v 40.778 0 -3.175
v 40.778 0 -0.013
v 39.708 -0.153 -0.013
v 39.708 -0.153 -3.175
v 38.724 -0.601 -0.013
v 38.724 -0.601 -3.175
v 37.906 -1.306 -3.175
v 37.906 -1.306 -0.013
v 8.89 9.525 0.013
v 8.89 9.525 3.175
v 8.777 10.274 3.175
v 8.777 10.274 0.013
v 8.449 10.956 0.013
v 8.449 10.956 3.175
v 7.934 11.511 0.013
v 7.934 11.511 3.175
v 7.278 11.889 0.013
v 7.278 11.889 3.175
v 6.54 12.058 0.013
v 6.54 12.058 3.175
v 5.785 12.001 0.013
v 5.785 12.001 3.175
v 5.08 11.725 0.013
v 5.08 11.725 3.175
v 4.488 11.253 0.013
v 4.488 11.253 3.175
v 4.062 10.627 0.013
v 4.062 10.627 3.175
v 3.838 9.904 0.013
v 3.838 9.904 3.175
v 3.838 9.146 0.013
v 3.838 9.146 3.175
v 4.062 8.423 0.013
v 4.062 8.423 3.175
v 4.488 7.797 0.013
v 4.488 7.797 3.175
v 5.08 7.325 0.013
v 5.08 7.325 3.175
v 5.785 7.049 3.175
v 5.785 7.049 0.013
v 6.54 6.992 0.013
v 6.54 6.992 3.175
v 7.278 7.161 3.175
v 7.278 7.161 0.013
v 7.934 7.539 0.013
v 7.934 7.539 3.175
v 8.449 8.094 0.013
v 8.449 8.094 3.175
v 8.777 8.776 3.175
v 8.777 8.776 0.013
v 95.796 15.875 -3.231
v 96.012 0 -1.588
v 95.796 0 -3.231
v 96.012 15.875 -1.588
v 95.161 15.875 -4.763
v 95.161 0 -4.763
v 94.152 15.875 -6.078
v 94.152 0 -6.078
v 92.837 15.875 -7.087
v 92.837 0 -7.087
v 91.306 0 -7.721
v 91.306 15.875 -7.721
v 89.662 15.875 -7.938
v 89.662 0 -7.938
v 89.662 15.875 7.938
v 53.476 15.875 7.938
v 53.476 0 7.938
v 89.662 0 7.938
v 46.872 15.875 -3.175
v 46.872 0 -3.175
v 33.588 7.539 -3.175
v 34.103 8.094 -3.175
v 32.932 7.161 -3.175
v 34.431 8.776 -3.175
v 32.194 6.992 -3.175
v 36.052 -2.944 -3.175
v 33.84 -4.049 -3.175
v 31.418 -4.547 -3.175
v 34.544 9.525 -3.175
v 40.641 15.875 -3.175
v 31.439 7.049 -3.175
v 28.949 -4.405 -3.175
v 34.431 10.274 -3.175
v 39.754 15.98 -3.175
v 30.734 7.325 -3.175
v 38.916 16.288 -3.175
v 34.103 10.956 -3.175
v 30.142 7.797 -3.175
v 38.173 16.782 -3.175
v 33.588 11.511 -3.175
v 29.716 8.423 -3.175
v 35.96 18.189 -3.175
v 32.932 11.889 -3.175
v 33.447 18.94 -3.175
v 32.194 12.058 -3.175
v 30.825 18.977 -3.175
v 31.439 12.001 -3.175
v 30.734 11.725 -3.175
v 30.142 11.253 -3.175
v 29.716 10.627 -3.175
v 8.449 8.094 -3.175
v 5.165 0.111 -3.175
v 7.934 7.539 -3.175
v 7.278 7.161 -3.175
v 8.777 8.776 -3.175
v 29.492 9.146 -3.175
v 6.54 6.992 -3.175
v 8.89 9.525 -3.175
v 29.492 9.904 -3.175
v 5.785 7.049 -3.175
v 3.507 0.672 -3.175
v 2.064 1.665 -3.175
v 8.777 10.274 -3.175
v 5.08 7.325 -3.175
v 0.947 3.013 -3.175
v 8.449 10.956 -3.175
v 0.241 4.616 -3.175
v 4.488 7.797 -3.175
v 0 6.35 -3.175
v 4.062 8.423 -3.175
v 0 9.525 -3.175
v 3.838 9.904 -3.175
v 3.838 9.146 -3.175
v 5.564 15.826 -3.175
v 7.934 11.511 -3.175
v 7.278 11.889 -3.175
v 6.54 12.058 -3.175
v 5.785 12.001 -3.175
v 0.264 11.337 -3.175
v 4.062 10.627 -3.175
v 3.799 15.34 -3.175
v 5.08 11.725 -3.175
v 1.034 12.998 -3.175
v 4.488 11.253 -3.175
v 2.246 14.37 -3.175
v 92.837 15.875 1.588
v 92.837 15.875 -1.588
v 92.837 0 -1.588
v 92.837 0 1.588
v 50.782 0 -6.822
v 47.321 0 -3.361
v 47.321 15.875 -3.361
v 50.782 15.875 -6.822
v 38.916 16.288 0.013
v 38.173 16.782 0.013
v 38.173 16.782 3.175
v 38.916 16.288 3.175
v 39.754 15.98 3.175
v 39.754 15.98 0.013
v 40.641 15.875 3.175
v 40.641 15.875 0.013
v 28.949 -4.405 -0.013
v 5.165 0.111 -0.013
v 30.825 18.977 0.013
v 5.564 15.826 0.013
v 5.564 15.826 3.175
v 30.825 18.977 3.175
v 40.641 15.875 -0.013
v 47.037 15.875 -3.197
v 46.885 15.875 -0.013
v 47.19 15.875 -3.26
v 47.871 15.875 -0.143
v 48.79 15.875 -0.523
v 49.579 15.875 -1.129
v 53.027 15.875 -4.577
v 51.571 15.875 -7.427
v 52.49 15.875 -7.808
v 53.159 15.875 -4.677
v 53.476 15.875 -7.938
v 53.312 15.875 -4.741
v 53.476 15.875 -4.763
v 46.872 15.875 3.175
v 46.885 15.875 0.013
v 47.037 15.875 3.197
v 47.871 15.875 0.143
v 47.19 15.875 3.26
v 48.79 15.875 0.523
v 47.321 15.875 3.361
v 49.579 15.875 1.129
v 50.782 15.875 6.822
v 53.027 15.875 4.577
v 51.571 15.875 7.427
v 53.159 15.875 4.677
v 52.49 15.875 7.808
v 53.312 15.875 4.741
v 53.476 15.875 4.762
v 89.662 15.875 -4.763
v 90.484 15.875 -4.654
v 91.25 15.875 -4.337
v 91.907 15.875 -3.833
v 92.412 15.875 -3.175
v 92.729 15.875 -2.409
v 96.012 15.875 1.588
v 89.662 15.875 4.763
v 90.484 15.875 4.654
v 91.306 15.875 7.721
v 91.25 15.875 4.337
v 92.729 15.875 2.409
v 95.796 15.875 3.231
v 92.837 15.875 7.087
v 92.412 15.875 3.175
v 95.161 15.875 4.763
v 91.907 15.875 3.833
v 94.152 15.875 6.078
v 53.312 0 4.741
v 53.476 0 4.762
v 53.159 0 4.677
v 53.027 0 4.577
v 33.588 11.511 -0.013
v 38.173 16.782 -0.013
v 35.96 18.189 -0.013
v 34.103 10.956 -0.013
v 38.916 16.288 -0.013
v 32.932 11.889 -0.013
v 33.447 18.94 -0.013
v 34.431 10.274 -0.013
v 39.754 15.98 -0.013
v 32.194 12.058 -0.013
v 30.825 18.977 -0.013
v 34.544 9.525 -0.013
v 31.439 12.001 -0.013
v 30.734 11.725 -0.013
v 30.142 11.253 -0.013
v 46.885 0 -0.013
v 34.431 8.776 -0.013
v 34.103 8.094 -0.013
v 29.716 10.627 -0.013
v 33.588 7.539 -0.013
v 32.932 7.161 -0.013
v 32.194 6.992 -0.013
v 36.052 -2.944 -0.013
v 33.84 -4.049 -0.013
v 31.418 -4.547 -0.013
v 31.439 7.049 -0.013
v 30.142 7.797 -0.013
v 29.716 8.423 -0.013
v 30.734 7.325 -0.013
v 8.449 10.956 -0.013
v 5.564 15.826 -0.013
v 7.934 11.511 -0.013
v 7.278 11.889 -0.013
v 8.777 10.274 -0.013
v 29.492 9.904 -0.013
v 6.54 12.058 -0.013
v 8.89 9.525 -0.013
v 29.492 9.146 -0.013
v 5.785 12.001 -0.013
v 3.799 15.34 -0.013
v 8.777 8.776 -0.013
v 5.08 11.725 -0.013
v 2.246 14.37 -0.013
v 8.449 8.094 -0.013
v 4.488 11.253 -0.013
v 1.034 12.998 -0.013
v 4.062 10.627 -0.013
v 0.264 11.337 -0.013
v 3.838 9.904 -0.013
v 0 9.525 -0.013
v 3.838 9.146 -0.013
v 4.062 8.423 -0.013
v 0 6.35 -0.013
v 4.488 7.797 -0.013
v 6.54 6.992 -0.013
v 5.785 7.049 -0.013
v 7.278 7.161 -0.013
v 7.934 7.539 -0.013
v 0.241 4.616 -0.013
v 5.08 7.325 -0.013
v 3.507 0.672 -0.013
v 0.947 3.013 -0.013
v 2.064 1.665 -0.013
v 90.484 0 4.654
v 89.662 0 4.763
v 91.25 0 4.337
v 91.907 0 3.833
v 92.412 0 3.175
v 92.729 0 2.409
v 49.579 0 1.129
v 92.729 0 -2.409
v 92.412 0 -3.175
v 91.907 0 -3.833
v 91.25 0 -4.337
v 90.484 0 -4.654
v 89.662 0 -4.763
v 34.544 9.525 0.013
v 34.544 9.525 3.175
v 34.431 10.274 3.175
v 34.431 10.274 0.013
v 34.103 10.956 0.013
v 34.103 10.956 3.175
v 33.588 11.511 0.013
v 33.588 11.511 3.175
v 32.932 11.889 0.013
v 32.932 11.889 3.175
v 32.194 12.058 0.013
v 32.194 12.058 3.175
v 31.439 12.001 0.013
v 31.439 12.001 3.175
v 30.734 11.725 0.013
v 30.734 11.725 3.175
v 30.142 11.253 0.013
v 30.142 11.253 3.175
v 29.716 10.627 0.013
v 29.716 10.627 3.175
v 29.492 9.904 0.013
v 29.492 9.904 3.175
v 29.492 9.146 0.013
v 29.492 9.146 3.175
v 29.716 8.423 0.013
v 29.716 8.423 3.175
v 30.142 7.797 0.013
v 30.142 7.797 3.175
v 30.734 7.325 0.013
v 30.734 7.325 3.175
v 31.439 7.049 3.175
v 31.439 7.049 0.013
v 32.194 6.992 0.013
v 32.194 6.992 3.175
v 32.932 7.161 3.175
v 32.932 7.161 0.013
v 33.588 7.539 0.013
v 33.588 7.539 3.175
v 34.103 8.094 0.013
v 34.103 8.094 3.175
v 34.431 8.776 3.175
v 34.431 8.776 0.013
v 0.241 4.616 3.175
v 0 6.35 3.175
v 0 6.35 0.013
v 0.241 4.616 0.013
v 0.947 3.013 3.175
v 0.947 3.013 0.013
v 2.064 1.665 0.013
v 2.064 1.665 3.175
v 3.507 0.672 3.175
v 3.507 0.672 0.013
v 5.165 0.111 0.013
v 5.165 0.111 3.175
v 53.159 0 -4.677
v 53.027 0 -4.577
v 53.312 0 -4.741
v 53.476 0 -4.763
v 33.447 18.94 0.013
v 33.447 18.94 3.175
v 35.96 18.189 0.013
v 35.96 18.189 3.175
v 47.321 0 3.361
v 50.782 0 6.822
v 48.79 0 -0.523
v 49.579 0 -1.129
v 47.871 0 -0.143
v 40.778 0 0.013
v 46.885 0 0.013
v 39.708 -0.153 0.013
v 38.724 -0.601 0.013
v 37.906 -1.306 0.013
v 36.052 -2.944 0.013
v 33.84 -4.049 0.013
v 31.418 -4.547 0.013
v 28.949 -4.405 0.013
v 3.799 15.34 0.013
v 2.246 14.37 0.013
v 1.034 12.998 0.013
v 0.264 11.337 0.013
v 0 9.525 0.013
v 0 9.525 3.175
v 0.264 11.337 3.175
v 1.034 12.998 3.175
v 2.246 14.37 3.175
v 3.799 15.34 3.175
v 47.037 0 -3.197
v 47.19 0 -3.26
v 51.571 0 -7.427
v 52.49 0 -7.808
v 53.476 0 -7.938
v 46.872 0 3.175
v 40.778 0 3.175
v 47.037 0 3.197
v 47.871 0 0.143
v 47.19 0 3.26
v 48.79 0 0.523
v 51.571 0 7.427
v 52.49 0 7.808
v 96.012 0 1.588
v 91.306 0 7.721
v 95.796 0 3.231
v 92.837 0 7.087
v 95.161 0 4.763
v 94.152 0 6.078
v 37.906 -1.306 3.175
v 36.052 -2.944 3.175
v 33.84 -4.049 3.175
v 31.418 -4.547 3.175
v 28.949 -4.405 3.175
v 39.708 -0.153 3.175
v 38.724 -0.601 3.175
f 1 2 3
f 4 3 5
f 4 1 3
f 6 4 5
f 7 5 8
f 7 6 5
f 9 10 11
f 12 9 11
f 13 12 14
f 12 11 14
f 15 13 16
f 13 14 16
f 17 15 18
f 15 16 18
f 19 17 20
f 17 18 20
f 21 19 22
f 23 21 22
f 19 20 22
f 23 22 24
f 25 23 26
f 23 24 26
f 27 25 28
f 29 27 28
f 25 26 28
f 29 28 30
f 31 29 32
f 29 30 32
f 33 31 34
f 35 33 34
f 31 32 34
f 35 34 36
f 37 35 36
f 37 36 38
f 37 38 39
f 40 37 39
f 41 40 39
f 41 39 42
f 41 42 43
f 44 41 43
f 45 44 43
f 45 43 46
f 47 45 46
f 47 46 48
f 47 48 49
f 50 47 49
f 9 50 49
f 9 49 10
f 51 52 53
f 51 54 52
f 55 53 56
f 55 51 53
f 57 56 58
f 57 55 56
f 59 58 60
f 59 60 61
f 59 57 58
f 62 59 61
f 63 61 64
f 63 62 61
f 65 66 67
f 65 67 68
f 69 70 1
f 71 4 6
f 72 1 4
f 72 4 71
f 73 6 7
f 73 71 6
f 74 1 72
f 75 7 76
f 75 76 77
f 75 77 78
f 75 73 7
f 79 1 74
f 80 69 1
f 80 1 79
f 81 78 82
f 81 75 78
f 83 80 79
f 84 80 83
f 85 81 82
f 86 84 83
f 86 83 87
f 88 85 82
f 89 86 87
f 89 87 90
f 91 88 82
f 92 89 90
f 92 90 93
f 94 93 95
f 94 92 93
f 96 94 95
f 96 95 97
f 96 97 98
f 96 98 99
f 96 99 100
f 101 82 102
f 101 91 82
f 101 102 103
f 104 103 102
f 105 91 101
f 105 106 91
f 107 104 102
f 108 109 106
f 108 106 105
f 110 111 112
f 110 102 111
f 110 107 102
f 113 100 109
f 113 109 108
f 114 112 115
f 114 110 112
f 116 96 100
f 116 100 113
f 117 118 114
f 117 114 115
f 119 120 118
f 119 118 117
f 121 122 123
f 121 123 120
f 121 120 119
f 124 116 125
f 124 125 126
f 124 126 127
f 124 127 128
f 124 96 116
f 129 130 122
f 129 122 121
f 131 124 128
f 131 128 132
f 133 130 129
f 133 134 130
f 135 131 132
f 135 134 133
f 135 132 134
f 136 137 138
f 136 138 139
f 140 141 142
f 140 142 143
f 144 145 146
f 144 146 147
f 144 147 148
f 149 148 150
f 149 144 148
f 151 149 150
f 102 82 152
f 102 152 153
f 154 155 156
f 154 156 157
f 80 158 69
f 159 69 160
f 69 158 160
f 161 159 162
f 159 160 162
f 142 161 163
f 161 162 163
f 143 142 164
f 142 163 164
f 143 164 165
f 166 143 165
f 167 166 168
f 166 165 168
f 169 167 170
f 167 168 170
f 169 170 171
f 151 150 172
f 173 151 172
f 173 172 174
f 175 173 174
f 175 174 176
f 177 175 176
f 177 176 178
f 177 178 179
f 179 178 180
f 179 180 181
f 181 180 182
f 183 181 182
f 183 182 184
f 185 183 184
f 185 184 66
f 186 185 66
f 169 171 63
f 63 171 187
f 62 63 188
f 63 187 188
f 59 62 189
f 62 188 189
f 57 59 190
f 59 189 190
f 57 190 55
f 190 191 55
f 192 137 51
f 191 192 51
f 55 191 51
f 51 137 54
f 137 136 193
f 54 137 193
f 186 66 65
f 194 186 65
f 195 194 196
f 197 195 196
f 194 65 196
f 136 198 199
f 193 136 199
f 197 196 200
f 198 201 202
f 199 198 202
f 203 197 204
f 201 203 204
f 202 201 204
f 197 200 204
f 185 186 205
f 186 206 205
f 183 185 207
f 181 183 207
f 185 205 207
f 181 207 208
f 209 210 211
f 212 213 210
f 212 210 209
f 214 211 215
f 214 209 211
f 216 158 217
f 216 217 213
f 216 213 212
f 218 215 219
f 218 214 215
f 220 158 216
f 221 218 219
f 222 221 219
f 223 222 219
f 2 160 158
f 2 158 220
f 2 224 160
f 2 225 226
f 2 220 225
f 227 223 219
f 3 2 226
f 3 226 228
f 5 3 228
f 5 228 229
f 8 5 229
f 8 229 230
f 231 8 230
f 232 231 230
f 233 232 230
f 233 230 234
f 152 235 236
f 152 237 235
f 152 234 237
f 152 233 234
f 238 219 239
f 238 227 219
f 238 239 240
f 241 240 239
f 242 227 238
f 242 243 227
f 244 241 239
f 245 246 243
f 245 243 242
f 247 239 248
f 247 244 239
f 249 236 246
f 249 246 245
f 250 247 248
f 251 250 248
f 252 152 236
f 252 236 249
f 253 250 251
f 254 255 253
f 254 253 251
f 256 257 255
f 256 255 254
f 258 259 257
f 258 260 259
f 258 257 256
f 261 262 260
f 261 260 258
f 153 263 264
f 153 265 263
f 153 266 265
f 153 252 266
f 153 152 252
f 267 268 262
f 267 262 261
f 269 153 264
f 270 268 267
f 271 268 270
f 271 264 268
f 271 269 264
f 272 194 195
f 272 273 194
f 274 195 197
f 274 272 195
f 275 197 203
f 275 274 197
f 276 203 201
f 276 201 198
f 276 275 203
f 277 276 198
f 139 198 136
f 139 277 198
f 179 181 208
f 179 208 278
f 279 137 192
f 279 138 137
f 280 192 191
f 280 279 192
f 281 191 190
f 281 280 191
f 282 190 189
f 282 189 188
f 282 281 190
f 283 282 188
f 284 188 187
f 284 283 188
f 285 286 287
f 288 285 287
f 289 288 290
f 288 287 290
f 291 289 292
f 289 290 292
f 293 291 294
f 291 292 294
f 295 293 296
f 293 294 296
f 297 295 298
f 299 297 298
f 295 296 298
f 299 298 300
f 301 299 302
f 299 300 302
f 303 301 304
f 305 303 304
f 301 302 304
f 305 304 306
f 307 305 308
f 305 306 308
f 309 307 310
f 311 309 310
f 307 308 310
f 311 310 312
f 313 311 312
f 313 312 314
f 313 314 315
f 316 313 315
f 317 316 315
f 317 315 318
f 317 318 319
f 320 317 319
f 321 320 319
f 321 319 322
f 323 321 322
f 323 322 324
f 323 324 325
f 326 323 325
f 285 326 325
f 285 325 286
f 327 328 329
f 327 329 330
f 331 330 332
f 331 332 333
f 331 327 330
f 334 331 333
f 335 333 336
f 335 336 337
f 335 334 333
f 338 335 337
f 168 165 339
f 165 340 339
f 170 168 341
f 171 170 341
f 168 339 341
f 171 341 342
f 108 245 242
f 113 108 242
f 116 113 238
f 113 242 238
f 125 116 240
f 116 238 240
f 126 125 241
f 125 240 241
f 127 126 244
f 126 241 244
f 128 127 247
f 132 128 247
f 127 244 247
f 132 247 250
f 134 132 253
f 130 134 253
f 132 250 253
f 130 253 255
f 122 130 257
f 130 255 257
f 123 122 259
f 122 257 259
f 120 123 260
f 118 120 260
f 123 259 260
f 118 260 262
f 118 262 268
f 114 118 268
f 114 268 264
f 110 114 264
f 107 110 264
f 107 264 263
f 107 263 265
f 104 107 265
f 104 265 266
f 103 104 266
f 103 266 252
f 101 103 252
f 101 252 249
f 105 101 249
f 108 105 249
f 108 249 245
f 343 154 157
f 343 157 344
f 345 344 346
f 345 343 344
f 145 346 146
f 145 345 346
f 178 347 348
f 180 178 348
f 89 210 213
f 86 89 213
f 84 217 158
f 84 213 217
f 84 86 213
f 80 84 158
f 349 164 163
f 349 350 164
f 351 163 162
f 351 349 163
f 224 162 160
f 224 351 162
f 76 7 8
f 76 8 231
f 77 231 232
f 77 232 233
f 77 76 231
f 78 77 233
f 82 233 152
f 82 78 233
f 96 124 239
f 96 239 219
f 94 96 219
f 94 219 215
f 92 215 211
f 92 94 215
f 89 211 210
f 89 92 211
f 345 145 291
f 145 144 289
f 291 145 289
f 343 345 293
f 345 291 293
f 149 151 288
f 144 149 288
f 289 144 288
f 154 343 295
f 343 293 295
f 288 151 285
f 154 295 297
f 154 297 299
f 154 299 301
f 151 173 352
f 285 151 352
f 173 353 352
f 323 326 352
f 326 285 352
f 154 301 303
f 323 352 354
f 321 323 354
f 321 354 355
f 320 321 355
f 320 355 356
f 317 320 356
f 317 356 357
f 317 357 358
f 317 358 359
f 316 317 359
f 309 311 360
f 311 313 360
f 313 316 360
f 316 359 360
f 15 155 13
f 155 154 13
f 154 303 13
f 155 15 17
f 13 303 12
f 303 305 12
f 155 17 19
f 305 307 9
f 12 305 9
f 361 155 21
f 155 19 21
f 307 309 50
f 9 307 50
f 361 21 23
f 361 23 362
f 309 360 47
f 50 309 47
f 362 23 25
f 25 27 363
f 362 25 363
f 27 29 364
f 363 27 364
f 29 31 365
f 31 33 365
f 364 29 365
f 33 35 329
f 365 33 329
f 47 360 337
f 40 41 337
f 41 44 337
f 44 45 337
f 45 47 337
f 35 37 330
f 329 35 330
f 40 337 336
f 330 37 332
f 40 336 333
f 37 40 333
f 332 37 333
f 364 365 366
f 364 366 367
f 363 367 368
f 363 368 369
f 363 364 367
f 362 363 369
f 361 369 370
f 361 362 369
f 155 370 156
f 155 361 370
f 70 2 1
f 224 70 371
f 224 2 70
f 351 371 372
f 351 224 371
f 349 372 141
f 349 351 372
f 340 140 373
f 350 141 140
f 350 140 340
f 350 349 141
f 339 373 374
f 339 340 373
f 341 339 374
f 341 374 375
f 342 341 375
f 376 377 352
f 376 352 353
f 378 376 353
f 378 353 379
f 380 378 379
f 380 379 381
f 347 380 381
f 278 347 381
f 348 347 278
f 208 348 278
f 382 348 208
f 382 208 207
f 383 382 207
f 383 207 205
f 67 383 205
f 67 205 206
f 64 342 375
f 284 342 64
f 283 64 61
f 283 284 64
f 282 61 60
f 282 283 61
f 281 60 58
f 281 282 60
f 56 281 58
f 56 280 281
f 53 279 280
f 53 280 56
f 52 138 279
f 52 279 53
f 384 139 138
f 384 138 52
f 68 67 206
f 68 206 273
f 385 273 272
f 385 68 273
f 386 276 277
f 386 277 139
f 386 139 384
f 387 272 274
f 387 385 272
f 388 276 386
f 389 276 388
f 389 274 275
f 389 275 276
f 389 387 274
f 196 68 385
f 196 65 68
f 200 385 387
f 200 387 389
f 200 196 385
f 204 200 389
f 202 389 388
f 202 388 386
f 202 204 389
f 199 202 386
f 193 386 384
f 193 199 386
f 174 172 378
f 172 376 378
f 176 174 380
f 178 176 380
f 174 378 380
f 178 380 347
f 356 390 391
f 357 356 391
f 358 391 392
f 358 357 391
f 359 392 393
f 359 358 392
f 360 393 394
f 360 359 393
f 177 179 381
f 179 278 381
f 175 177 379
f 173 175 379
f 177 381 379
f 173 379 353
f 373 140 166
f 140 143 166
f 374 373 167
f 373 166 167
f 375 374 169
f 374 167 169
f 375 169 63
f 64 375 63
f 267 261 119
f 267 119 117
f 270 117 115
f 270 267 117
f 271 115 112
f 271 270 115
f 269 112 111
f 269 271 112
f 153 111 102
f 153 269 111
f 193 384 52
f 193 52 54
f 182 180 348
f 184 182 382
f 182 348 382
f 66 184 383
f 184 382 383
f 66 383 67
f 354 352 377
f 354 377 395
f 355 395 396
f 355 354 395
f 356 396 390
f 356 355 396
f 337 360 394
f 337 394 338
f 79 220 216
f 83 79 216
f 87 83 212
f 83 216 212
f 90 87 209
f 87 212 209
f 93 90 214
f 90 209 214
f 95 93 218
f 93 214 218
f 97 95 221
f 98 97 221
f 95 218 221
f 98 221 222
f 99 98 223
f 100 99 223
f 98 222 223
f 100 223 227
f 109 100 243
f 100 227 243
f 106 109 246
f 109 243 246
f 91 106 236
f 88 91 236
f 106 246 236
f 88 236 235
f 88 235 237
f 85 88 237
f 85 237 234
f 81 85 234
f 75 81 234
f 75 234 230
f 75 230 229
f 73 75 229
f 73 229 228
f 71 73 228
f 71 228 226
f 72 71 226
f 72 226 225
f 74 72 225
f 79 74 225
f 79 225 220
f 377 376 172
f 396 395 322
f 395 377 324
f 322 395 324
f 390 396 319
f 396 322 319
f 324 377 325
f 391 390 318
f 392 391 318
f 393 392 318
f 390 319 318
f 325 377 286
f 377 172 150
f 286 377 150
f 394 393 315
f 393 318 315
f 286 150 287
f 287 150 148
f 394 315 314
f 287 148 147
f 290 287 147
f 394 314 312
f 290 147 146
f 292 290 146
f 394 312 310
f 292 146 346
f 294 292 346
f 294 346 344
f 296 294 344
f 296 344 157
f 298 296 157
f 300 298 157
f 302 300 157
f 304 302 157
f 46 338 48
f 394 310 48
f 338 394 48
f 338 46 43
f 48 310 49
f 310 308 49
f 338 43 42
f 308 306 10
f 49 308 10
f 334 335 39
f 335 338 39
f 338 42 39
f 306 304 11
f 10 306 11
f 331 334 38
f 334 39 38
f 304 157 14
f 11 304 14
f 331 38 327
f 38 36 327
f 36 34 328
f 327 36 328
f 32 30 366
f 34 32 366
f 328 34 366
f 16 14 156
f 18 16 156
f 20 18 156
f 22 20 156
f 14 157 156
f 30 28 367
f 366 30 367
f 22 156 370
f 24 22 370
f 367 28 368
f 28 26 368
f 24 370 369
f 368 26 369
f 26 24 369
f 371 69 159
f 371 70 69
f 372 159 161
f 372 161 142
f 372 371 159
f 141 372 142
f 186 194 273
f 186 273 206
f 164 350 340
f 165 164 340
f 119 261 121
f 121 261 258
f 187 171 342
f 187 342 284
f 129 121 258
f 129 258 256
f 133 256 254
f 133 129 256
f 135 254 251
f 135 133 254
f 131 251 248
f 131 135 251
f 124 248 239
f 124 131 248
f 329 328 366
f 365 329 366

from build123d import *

# Parameters (mm, degrees)
SKETCH1_W               = 96.012
SKETCH1_H               = 15.875
BASE_EXTRUDE_DEPTH      = 7.9375
CUT_EXTRUDE1_DEPTH      = 98.638740648
FILLET5_R               = 0.635
FILLET6_R               = 3.81
FILLET7_R               = 3.175
FILLET8_R               = 6.35
FILLET9_R               = 6.35
FILLET10_R              = 6.35
BOSS_EXTRUDE3_START     = -6.35
BOSS_EXTRUDE3_DEPTH     = 6.35
FILLET11_R              = 3.81
SKETCH7_R               = 2.54
CUT_EXTRUDE5_DEPTH      = 99.512406834
CUT_EXTRUDE6_DEPTH      = 99.485470295
CUT_EXTRUDE6_DEPTH_BACK = 99.485470295
SKETCH8_W               = 56.651025612
SKETCH8_H               = 0.0254
FILLET12_R              = 3.81
FILLET13_R              = 3.81


with BuildPart() as part:
    # Sketch1 → Base-Extrude (new, symmetric)
    with BuildSketch(Plane.XY):
        with Locations((48.006, 7.9375)):
            Rectangle(SKETCH1_W, SKETCH1_H)
    extrude(amount=BASE_EXTRUDE_DEPTH, both=True)

    # Sketch3 → Cut-Extrude1 (cut, through all)
    with BuildSketch(Plane(origin=(0, 15.875, 0), x_dir=(-1, 0, 0), z_dir=(0, 1, 0))):
        Polygon((-53.213, -4.7625), (-92.837, -4.7625), (-92.837, 4.7625), (-53.213, 4.7625), (-48.4505, 0), align=None)
        Polygon((2.11806403, -3.175), (-47.135371939, -3.175), (-55.848364541, -11.887992602), (2.11806403, -11.887992602), align=None)
        Polygon((2.11806403, 3.175), (-47.135371939, 3.175), (-55.848364541, 11.887992602), (2.11806403, 11.887992602), align=None)
    extrude(amount=-CUT_EXTRUDE1_DEPTH, mode=Mode.SUBTRACT)

    # Fillet5
    fillet5_edges = [part.edges().sort_by_distance(p)[0] for p in [
        (53.213, 7.9375, -4.7625),
        (53.213, 7.9375, 4.7625),
        (47.135371939, 7.9375, 3.175),
        (47.135371939, 7.9375, -3.175),
    ]]
    fillet(fillet5_edges, radius=FILLET5_R)

    # Fillet6
    fillet6_edges = [part.edges().sort_by_distance(p)[0] for p in [
        (51.897871939, 7.9375, 7.9375),
        (51.897871939, 7.9375, -7.9375),
    ]]
    fillet(fillet6_edges, radius=FILLET6_R)

    # Fillet7
    fillet7_edges = [part.edges().sort_by_distance(p)[0] for p in [
        (92.837, 7.9375, -4.7625),
        (92.837, 7.9375, 4.7625),
    ]]
    fillet(fillet7_edges, radius=FILLET7_R)

    # Fillet8
    fillet8_edges = [part.edges().sort_by_distance(p)[0] for p in [
        (96.012, 7.9375, 7.9375),
        (96.012, 7.9375, -7.9375),
    ]]
    fillet(fillet8_edges, radius=FILLET8_R)

    # Fillet9
    fillet9_edges = [part.edges().sort_by_distance(p)[0] for p in [
        (0, 15.875, 0),
    ]]
    fillet(fillet9_edges, radius=FILLET9_R)

    # Fillet10
    fillet10_edges = [part.edges().sort_by_distance(p)[0] for p in [
        (0, 0, 0),
    ]]
    fillet(fillet10_edges, radius=FILLET10_R)

    # Sketch6 → Boss-Extrude3 (add)
    with BuildSketch(Plane.XY.offset(3.175).offset(BOSS_EXTRUDE3_START)):
        with BuildLine():
            Line((5.564108911, 15.826180461), (30.825163366, 18.976770691))
            ThreePointArc((30.825163366, 18.976770691), (39.943880119, 14.786551928), (40.249024971, 4.755808431))
            ThreePointArc((40.249024971, 4.755808431), (36.72434383, -2.446073762), (28.949130797, -4.404784191))
            Line((28.949130797, -4.404784191), (5.165376283, 0.111477206))
            ThreePointArc((5.165376283, 0.111477206), (1.458943846, 2.300300048), (0, 6.35))
            Line((0, 6.35), (0, 9.525))
            ThreePointArc((0, 9.525), (1.590120358, 13.728099546), (5.564108911, 15.826180461))
        make_face()
    extrude(amount=BOSS_EXTRUDE3_DEPTH)

    # Fillet11
    fillet11_edges = [part.edges().sort_by_distance(p)[0] for p in [
        (38.862, 0, 0),
        (39.103515829, 15.875, 0),
    ]]
    fillet(fillet11_edges, radius=FILLET11_R)

    # Sketch7 → Cut-Extrude5 (cut, through all)
    with BuildSketch(Plane.XY.offset(3.175)):
        with Locations((6.35, 9.525)):
            Circle(SKETCH7_R)
        with Locations((32.004, 9.525)):
            Circle(SKETCH7_R)
    extrude(amount=-CUT_EXTRUDE5_DEPTH, mode=Mode.SUBTRACT)

    # Sketch8 → Cut-Extrude6 (cut, two sides: drawn at the far end of the back side and taken through both)
    with BuildSketch(Plane(origin=(0, 15.875, 0), x_dir=(-1, 0, 0), z_dir=(0, 1, 0)).offset(-CUT_EXTRUDE6_DEPTH_BACK)):
        with Locations((-25.150512806, 0)):
            Rectangle(SKETCH8_W, SKETCH8_H)
    extrude(amount=CUT_EXTRUDE6_DEPTH + CUT_EXTRUDE6_DEPTH_BACK, mode=Mode.SUBTRACT)

    # Fillet12
    fillet12_edges = [part.edges().sort_by_distance(p)[0] for p in [
        (48.4632, 7.9375, 0.0127),
    ]]
    fillet(fillet12_edges, radius=FILLET12_R)

    # Fillet13
    fillet13_edges = [part.edges().sort_by_distance(p)[0] for p in [
        (48.4632, 7.9375, -0.0127),
    ]]
    fillet(fillet13_edges, radius=FILLET13_R)


solid = part.part
